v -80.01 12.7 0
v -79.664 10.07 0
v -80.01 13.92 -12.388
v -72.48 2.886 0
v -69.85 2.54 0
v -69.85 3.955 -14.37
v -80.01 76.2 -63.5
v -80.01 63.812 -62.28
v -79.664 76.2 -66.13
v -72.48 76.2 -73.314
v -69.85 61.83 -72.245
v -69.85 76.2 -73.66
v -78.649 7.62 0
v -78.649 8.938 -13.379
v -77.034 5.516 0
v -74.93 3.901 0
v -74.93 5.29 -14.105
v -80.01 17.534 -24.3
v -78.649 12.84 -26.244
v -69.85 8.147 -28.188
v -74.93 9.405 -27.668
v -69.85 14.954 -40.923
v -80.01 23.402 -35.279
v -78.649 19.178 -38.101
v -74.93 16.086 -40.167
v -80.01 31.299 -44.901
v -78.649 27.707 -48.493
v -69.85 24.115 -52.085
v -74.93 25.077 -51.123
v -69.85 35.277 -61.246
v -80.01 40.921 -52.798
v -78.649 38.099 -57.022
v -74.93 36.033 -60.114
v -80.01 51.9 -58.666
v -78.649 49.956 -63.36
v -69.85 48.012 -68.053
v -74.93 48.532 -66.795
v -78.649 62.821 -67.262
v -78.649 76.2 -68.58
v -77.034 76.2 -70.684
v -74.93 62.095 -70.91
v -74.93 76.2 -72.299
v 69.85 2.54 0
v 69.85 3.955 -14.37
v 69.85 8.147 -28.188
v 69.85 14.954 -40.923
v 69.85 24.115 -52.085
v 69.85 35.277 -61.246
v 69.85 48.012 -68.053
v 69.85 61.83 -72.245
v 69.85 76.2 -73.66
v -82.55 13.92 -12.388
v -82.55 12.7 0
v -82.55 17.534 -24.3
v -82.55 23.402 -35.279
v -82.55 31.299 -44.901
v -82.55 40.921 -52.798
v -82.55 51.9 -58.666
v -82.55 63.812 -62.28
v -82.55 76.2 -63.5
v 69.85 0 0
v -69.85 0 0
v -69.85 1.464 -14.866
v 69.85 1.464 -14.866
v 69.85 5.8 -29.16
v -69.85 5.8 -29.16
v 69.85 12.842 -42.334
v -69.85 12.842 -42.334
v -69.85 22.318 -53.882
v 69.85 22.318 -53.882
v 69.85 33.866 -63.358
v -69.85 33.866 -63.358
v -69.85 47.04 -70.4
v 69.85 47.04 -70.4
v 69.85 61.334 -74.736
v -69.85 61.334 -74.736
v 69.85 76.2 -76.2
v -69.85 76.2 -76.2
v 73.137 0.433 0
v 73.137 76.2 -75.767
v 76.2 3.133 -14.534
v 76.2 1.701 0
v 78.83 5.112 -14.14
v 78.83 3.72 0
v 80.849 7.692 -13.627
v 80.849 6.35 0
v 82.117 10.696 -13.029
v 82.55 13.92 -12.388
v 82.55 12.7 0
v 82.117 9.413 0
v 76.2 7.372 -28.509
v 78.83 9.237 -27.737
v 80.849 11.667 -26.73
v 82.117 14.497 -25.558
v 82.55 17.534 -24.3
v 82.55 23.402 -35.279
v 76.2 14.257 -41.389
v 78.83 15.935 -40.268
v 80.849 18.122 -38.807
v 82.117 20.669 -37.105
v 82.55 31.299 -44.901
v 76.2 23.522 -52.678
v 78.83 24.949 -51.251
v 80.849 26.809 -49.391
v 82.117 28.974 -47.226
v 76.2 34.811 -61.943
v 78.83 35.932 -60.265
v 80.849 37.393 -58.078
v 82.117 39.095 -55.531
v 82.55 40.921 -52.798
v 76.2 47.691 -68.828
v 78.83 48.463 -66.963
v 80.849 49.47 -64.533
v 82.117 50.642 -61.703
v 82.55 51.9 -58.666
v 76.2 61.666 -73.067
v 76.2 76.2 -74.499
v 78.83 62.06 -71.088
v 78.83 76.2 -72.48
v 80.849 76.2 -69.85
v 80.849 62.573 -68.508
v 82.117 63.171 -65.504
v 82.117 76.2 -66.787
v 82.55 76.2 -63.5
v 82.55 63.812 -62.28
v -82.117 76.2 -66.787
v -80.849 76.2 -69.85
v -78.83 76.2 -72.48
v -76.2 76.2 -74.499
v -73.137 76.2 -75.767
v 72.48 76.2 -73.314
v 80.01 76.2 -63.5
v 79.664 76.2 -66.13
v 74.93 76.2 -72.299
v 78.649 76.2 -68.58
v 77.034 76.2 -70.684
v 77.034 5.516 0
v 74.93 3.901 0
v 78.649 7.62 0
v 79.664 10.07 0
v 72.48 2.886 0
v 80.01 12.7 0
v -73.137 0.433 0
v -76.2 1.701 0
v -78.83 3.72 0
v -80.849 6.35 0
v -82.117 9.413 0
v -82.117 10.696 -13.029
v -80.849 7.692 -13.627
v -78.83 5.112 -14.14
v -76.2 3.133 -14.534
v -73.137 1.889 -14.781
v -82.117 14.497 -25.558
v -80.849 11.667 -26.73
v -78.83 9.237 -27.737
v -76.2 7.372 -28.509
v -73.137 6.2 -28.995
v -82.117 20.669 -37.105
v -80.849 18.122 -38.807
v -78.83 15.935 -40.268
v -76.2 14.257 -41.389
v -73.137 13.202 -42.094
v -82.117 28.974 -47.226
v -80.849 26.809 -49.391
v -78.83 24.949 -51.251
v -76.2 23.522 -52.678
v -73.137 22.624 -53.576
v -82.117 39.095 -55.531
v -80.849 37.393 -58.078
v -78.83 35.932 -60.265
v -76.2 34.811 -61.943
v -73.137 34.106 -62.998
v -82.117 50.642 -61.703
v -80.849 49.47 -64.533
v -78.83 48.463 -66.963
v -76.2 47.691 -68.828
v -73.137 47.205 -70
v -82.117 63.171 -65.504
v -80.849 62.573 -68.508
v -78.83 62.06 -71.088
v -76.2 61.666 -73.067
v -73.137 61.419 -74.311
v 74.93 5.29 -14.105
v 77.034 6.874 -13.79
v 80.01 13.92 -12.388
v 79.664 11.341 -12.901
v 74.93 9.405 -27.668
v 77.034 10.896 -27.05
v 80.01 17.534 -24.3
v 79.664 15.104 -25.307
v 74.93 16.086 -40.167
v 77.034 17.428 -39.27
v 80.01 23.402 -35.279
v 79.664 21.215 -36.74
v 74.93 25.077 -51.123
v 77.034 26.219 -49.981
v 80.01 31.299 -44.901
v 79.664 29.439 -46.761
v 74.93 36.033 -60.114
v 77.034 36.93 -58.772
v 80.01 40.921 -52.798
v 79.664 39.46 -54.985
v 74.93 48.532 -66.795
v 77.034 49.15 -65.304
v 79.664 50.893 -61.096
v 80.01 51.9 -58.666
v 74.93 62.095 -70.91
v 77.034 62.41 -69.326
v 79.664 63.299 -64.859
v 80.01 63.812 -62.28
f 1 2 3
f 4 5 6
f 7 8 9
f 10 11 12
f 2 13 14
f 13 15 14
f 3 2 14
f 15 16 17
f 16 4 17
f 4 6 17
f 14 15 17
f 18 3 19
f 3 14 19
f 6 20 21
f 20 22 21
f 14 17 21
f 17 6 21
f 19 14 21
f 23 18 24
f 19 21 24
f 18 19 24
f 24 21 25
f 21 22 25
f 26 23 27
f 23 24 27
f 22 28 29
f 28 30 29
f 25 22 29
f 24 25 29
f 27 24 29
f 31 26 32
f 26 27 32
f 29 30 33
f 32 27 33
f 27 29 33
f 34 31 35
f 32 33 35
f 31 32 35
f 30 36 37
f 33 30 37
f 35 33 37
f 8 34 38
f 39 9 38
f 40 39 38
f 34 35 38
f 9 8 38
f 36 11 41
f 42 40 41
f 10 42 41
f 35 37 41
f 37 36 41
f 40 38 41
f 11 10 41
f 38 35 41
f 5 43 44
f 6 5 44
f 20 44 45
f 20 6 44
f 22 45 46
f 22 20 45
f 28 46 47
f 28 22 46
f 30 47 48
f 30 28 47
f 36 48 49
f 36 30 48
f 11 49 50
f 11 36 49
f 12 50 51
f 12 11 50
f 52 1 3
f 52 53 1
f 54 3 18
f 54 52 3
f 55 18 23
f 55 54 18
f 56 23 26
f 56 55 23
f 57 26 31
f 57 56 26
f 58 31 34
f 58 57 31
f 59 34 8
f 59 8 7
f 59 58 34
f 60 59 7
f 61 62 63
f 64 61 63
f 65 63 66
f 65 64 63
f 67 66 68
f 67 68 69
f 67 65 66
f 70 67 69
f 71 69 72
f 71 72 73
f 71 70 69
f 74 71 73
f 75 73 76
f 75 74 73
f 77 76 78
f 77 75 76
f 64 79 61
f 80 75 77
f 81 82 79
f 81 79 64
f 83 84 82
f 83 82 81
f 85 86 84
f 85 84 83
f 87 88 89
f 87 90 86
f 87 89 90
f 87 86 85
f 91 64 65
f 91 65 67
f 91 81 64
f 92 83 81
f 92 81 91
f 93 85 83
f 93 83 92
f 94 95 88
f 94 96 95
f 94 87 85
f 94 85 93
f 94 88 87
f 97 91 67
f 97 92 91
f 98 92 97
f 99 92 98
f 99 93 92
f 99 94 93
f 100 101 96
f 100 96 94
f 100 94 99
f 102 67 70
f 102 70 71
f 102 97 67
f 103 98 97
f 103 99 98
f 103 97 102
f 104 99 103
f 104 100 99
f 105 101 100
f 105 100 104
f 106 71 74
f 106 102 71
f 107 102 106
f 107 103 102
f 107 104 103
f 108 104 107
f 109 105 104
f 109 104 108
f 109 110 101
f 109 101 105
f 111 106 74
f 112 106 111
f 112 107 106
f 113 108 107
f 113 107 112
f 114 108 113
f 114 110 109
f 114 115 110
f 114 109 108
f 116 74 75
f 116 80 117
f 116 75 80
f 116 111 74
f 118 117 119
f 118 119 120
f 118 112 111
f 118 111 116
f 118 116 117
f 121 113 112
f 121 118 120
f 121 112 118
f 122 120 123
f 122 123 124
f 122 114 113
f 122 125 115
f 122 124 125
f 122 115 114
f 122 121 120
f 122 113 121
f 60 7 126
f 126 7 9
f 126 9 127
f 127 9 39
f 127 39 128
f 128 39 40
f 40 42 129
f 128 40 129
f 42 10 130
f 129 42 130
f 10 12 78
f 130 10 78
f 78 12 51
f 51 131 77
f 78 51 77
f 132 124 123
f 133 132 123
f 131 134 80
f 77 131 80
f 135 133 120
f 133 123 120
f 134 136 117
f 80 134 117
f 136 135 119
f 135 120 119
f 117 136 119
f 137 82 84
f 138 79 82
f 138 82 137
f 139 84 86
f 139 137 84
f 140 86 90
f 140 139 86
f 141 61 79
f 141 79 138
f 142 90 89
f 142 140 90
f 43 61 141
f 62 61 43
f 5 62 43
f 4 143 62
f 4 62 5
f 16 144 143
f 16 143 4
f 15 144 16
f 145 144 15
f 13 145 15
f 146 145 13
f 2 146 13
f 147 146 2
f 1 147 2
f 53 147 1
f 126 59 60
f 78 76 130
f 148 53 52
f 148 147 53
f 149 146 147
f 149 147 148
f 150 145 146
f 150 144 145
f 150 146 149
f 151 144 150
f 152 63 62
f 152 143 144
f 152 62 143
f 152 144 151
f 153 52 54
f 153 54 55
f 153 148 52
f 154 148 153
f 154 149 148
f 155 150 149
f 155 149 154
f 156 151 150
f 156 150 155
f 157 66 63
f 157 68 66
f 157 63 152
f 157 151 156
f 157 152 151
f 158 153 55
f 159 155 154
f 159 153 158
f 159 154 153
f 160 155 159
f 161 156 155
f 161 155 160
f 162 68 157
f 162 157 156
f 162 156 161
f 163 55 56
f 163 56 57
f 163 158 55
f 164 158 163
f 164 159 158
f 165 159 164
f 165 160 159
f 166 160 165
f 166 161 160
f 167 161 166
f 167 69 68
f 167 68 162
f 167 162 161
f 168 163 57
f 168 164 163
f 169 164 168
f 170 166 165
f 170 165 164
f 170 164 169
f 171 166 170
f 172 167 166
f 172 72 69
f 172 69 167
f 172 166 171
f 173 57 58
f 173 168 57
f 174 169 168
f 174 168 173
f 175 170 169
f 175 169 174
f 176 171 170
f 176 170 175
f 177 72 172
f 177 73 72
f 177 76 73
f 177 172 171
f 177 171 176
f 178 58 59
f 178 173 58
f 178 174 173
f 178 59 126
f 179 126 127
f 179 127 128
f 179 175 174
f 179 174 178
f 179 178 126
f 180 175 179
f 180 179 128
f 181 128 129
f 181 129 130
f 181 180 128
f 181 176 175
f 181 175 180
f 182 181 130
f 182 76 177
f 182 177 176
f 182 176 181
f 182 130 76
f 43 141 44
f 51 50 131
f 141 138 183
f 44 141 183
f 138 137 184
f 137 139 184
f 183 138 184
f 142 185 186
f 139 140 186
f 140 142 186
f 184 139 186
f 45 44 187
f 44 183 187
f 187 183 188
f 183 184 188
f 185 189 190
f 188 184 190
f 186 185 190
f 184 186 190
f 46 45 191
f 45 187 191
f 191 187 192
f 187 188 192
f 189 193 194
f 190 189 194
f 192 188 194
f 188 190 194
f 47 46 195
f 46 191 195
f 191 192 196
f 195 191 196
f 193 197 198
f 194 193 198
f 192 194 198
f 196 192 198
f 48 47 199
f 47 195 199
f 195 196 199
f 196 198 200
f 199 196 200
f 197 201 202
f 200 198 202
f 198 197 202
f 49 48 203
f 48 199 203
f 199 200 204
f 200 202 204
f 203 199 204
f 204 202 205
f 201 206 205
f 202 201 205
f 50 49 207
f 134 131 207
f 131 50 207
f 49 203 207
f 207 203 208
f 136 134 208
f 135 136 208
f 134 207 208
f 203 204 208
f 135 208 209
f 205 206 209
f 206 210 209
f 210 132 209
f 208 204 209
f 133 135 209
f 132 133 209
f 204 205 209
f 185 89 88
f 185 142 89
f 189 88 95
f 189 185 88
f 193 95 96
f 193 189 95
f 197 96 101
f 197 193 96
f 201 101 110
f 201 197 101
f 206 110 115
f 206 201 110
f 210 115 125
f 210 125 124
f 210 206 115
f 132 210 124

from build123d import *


with BuildPart() as part:
    # Sweep1: sweep along a path in Sketch2
    with BuildLine(Plane(origin=(0, 0, 0), x_dir=(0, 0, -1), z_dir=(1, 0, 0))) as sweep1_path:
        ThreePointArc((0, 0), (53.881536726, 22.318463274), (76.2, 76.2))
    # Sketch1 → Sweep1 (sweep)
    with BuildSketch(Plane.XY):
        with BuildLine():
            Line((-69.85, 0), (69.85, 0))
            ThreePointArc((69.85, 0), (78.830256121, 3.719743879), (82.55, 12.7))
            Line((82.55, 12.7), (80.01, 12.7))
            ThreePointArc((80.01, 12.7), (77.034204897, 5.515795103), (69.85, 2.54))
            Line((69.85, 2.54), (-69.85, 2.54))
            ThreePointArc((-69.85, 2.54), (-77.034204897, 5.515795103), (-80.01, 12.7))
            Line((-80.01, 12.7), (-82.55, 12.7))
            ThreePointArc((-82.55, 12.7), (-78.830256121, 3.719743879), (-69.85, 0))
        make_face()
    sweep(path=sweep1_path.line)


solid = part.part
